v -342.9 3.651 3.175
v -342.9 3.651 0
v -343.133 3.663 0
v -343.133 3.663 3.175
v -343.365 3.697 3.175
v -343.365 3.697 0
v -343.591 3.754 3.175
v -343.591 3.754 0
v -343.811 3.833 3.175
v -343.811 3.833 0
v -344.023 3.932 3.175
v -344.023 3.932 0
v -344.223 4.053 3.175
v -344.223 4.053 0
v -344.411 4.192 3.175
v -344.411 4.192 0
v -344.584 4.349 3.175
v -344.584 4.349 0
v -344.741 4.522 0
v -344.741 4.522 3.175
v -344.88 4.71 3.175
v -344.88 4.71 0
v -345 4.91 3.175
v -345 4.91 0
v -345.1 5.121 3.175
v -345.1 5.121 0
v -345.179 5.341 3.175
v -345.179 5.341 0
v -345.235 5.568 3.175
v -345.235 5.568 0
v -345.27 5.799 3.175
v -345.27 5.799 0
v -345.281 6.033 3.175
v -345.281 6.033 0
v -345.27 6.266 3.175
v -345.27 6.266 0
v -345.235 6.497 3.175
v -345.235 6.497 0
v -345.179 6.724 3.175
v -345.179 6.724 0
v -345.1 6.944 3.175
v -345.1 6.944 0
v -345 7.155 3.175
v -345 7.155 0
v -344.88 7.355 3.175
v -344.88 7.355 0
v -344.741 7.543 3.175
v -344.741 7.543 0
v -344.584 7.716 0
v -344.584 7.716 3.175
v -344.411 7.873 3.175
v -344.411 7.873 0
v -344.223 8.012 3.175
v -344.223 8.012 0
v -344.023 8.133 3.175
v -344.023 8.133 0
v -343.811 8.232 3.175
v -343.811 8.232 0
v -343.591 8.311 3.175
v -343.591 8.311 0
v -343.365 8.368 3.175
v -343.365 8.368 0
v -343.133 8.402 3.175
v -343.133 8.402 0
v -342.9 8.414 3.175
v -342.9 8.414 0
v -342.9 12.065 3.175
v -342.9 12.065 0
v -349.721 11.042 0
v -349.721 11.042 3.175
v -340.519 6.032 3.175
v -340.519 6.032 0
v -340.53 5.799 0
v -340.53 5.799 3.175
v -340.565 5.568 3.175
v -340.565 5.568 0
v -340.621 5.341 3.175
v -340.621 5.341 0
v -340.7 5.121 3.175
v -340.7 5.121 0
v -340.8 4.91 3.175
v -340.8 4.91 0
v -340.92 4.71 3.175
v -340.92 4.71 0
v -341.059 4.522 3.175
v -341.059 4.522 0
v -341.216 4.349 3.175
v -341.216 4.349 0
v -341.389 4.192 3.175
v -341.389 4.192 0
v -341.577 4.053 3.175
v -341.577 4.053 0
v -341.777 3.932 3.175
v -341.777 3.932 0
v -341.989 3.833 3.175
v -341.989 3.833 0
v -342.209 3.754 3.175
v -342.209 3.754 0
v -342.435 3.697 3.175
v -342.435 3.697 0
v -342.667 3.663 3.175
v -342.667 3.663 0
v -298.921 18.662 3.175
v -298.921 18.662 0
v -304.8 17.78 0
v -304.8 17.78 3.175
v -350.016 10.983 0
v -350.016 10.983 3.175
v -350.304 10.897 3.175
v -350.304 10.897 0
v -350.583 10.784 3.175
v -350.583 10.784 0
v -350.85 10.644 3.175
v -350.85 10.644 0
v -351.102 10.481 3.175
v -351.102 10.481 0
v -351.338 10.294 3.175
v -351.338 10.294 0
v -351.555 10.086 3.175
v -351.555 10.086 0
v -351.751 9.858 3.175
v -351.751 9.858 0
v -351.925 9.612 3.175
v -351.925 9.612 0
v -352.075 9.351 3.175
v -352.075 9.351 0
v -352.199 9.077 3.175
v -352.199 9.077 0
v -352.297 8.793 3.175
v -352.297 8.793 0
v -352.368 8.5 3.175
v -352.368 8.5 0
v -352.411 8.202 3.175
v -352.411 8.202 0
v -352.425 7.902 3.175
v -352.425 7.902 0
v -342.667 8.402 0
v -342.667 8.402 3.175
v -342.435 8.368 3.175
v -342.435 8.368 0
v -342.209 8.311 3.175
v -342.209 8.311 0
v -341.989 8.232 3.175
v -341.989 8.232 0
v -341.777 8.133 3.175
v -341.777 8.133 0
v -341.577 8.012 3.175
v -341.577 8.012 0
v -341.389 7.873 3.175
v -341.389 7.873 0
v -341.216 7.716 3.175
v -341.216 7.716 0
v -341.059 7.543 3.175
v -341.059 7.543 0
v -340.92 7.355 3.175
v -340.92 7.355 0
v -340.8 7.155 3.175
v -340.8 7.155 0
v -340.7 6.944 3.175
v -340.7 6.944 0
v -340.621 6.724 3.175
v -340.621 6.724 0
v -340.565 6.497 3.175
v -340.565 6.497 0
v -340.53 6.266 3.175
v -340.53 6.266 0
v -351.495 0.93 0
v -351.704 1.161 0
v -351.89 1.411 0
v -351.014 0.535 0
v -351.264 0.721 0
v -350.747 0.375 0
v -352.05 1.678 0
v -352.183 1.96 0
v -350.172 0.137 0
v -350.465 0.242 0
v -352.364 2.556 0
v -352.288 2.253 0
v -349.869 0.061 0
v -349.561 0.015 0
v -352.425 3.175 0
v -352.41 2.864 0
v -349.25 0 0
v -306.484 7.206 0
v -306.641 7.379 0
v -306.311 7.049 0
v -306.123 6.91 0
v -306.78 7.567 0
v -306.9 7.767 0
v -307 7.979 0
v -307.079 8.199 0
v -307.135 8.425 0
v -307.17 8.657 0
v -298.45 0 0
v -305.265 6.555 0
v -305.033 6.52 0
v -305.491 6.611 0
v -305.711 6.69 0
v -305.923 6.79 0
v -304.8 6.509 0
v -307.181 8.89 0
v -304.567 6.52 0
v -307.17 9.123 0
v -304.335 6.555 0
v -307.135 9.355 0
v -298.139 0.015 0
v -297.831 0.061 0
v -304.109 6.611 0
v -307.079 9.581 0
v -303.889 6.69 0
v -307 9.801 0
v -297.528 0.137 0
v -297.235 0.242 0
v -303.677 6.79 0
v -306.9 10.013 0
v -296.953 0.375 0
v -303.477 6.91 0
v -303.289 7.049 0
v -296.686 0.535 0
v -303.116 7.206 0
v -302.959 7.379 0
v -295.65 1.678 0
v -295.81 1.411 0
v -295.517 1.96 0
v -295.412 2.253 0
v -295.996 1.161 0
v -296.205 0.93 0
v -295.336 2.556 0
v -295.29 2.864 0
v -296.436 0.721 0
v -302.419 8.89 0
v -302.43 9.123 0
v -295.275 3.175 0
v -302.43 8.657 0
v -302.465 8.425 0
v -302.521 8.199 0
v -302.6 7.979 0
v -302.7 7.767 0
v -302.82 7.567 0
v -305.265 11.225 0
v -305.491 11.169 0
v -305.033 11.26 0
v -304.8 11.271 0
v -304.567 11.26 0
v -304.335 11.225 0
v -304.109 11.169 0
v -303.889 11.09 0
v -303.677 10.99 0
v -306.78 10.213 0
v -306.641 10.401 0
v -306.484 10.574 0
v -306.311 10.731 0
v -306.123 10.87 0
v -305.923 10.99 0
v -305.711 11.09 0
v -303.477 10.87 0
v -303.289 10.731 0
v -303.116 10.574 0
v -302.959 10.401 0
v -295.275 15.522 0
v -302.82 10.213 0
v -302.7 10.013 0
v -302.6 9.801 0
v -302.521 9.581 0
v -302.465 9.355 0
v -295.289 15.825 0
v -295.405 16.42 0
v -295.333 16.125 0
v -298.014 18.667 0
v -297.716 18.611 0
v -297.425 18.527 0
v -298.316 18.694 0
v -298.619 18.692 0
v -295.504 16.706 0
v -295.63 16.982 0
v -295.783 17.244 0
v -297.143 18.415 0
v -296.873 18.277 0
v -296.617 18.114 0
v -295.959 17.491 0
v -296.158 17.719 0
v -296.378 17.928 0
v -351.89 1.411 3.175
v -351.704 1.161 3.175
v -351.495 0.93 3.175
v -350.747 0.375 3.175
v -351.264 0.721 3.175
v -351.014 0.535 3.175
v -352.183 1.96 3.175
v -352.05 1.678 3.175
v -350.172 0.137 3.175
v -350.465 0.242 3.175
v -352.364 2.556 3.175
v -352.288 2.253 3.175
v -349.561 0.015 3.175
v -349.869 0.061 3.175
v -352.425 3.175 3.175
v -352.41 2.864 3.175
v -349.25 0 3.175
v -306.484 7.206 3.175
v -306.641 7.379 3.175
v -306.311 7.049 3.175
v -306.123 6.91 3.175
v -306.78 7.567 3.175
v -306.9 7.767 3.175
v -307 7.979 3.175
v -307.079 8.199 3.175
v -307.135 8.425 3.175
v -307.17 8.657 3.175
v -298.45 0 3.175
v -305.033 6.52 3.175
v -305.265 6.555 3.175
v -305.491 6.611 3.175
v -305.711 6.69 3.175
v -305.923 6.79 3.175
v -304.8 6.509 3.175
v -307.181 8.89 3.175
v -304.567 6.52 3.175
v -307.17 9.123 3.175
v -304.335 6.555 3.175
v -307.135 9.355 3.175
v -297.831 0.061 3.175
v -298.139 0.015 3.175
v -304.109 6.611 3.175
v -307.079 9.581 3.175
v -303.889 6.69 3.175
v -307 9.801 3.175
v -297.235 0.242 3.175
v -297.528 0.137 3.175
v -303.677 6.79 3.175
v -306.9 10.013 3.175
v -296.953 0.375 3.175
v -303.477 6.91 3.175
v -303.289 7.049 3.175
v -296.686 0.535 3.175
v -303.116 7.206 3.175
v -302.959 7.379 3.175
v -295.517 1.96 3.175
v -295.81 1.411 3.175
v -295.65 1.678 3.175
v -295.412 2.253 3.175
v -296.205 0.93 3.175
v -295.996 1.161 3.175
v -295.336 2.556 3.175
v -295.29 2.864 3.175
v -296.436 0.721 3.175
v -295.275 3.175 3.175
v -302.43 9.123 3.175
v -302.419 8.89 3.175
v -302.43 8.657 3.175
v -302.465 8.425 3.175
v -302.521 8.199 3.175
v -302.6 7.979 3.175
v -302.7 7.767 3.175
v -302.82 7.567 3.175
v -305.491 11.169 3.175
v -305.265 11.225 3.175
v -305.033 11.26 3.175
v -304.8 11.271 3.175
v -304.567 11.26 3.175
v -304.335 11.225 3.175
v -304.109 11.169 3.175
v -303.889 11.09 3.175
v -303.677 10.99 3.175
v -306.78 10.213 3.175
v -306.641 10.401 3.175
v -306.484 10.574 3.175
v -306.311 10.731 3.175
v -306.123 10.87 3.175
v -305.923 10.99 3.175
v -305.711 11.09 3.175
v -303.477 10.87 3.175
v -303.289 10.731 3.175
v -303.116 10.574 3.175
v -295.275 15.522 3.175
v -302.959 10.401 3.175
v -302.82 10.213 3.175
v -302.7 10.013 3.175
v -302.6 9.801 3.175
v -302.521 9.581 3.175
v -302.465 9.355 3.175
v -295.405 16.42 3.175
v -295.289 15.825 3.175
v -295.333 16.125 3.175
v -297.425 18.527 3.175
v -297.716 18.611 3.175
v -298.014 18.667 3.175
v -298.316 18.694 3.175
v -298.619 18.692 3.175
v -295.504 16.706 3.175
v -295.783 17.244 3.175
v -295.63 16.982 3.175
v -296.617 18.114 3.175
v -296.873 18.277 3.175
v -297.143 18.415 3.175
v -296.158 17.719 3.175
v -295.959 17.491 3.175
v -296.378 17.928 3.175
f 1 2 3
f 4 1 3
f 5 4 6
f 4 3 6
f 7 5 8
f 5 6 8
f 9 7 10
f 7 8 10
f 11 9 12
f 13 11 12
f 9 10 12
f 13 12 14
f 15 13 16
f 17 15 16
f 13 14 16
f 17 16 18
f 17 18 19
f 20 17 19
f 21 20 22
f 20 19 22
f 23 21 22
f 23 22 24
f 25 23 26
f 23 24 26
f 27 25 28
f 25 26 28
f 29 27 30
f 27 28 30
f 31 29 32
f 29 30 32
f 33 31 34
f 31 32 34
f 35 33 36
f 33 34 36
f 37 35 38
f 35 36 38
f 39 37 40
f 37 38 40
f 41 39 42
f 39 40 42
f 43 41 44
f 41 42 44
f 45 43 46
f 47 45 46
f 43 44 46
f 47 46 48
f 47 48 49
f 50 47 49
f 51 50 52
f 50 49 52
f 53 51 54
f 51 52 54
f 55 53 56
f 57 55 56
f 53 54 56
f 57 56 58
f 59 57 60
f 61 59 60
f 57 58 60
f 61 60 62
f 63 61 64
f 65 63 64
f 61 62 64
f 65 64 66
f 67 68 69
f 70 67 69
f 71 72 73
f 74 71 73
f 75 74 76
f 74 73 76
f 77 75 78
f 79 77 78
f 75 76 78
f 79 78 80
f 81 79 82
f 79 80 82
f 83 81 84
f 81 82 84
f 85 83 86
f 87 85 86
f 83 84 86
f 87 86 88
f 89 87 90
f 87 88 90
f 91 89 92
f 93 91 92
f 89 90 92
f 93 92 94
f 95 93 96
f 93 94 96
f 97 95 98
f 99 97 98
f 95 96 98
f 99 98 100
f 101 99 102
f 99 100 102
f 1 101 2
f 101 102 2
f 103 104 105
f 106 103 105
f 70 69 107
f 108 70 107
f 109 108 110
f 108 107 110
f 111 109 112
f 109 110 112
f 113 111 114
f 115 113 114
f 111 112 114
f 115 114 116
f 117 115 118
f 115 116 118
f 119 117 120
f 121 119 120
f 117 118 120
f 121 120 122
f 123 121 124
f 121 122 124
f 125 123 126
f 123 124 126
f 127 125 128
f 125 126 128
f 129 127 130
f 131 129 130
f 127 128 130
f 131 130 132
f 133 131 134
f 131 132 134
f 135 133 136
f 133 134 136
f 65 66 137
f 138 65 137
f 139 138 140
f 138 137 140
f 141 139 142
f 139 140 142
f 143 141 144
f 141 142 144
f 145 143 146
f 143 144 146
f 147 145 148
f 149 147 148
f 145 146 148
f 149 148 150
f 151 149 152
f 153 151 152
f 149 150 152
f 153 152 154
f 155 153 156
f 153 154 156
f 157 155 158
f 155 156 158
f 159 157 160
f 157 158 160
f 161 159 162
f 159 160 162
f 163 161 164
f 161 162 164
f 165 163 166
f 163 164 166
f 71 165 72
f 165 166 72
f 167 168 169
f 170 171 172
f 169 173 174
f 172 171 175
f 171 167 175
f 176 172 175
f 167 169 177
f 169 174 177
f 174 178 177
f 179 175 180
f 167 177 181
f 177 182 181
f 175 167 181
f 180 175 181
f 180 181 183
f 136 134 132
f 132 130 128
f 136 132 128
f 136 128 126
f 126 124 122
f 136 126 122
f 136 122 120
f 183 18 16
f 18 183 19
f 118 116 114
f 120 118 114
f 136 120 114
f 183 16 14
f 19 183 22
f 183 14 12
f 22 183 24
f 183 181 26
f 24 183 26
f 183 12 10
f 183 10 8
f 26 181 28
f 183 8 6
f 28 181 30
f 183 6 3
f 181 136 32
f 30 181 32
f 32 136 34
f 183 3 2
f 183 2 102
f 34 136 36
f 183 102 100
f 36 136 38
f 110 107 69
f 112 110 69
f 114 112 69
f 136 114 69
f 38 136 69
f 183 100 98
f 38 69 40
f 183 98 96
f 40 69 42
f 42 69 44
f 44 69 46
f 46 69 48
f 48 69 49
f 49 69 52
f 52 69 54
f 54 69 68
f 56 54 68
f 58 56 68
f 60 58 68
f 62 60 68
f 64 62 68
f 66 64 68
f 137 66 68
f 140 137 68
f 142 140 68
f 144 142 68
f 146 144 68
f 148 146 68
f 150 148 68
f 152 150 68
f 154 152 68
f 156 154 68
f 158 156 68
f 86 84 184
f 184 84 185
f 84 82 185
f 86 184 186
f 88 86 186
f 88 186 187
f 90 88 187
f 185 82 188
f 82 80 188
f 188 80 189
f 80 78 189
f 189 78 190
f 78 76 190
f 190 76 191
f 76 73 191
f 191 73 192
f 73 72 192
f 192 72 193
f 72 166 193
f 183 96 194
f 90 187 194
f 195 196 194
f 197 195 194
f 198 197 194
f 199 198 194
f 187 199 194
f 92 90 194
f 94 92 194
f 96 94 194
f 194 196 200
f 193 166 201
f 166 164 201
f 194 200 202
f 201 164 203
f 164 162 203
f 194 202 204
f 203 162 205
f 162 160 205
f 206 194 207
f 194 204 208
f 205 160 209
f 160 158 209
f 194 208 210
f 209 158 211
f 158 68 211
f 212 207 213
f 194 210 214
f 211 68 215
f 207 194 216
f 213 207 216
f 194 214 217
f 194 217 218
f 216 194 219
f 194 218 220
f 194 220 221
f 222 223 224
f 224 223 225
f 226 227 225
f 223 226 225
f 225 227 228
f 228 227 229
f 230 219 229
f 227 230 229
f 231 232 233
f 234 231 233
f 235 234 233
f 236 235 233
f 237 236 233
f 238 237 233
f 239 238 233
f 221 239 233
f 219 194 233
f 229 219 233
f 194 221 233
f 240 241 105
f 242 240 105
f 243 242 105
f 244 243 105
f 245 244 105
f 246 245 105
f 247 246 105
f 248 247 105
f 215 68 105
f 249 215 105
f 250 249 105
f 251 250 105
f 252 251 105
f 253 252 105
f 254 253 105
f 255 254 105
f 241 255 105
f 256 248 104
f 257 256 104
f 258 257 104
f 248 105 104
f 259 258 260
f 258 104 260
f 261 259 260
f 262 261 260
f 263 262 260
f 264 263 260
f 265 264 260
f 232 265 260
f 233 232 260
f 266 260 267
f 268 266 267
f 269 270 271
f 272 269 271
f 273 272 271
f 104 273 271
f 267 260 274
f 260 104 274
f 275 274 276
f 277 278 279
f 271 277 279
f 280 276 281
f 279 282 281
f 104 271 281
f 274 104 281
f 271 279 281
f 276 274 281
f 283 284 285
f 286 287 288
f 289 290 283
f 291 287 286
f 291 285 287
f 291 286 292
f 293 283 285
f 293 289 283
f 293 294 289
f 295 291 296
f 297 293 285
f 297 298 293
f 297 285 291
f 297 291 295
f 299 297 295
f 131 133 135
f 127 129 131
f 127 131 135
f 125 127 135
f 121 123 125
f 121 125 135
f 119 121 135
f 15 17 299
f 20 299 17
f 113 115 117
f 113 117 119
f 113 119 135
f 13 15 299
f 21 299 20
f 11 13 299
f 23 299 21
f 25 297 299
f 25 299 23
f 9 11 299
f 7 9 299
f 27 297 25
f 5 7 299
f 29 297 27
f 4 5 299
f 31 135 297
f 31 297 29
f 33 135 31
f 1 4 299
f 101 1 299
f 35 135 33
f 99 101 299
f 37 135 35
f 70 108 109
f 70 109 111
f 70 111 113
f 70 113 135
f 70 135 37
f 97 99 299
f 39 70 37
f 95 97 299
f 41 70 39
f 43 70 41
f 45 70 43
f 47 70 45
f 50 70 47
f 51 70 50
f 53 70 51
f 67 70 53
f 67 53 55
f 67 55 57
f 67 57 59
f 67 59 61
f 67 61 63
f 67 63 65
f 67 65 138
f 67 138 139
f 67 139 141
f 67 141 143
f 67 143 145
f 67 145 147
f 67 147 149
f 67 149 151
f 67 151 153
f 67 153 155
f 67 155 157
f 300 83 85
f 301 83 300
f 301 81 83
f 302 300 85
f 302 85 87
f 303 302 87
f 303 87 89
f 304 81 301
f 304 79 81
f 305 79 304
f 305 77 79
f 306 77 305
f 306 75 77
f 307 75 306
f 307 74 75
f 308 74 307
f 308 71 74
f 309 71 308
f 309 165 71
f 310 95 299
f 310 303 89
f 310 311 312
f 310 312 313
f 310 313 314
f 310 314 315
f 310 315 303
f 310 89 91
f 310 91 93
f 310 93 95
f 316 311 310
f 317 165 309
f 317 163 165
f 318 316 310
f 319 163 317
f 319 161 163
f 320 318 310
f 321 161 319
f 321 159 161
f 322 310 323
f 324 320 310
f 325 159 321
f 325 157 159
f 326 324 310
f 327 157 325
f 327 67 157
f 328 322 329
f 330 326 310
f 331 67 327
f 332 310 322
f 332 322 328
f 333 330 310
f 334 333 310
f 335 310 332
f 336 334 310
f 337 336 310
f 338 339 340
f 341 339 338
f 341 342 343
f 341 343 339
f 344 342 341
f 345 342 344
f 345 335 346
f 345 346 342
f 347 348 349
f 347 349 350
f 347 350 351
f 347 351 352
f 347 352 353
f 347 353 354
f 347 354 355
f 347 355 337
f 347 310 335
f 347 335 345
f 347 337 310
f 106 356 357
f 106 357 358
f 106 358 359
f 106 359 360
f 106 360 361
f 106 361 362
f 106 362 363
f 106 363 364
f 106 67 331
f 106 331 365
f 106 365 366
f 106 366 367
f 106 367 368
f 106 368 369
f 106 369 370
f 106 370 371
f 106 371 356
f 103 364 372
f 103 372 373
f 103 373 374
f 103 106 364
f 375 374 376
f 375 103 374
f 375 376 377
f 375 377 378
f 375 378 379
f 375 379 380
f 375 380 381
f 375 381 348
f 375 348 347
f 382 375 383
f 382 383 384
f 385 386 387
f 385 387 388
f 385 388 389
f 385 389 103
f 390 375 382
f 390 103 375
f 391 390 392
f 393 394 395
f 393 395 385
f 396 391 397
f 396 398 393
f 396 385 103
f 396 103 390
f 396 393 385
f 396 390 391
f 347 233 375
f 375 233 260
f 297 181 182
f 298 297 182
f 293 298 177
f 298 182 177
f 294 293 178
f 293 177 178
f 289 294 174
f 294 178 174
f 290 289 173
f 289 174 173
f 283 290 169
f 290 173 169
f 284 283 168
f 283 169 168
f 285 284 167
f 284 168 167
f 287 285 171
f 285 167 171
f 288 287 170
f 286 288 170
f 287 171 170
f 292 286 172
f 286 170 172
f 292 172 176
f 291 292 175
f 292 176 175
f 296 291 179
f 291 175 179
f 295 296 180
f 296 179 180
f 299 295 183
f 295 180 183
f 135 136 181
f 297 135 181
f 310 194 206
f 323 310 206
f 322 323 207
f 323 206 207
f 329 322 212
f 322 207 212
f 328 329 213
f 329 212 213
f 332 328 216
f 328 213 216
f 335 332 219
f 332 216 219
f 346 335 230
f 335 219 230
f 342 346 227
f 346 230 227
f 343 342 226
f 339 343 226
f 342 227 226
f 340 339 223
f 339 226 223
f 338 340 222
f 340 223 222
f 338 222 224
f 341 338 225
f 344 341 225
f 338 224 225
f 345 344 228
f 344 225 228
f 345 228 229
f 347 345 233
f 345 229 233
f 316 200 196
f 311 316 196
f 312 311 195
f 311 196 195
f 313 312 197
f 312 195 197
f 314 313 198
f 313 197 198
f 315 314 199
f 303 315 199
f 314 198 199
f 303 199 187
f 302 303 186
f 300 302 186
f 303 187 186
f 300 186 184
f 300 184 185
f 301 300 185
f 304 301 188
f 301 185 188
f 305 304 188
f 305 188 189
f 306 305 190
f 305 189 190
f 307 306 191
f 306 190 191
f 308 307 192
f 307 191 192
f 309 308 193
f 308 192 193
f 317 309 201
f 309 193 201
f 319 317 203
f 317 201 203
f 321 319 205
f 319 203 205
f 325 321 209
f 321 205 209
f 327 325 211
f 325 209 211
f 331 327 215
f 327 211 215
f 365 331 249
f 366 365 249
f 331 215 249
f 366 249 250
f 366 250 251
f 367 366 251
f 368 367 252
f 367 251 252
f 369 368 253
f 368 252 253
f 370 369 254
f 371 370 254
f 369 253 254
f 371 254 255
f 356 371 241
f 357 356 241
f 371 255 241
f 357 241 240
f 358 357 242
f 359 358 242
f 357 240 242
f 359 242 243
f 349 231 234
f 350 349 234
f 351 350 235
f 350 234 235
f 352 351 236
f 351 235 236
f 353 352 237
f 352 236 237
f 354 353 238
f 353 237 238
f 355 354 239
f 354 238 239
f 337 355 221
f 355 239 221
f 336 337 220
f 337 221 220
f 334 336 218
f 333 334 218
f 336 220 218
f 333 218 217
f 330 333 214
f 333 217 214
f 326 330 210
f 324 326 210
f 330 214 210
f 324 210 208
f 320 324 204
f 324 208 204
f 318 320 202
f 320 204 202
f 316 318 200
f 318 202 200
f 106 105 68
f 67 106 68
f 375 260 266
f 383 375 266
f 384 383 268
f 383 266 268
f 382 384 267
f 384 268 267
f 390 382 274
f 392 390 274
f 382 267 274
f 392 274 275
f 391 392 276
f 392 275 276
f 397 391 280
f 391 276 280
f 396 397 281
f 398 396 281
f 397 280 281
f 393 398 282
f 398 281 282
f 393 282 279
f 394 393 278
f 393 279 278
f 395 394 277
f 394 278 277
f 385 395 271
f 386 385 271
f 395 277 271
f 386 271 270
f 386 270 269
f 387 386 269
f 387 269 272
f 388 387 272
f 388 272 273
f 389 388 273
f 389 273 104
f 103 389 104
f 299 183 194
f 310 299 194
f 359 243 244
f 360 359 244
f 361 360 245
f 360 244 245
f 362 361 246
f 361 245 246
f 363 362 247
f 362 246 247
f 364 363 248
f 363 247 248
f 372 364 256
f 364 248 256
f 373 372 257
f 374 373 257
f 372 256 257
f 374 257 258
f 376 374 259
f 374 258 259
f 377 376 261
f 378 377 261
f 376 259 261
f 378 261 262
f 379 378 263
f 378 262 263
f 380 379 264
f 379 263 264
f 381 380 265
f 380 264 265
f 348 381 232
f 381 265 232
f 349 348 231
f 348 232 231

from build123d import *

# Parameters (mm, degrees)
BOSS_EXTRUDE1_DEPTH = 3.175


with BuildPart() as part:
    # Sketch1 → Boss-Extrude1 (new body)
    with BuildSketch(Plane.XY):
        with BuildLine():
            Line((-342.9, 12.065), (-349.720980938, 11.041852859))
            ThreePointArc((-349.720980938, 11.041852859), (-351.655825168, 9.97384631), (-352.425, 7.901979939))
            Line((-352.425, 7.901979939), (-352.425, 3.175))
            ThreePointArc((-352.425, 3.175), (-351.49506403, 0.92993597), (-349.25, 0))
            Line((-349.25, 0), (-342.9, 0))
            Line((-342.9, 0), (-342.9, 3.65125))
            ThreePointArc((-342.9, 3.65125), (-345.28125, 6.0325), (-342.9, 8.41375))
            Line((-342.9, 8.41375), (-342.9, 12.065))
        make_face()
        with BuildLine():
            Line((-304.8, 17.78), (-342.9, 12.065))
            Line((-342.9, 12.065), (-342.9, 8.41375))
            ThreePointArc((-342.9, 8.41375), (-341.216201977, 7.716298023), (-340.51875, 6.0325))
            ThreePointArc((-340.51875, 6.0325), (-341.216201977, 4.348701977), (-342.9, 3.65125))
            Line((-342.9, 3.65125), (-342.9, 0))
            Line((-342.9, 0), (-304.8, 0))
            Line((-304.8, 0), (-304.8, 6.50875))
            ThreePointArc((-304.8, 6.50875), (-307.18125, 8.89), (-304.8, 11.27125))
            Line((-304.8, 11.27125), (-304.8, 17.78))
        make_face()
        with BuildLine():
            Line((-298.920980938, 18.661852859), (-304.8, 17.78))
            Line((-304.8, 17.78), (-304.8, 11.27125))
            ThreePointArc((-304.8, 11.27125), (-303.116201977, 10.573798023), (-302.41875, 8.89))
            ThreePointArc((-302.41875, 8.89), (-303.116201977, 7.206201977), (-304.8, 6.50875))
            Line((-304.8, 6.50875), (-304.8, 0))
            Line((-304.8, 0), (-298.45, 0))
            ThreePointArc((-298.45, 0), (-296.20493597, 0.92993597), (-295.275, 3.175))
            Line((-295.275, 3.175), (-295.275, 15.521979939))
            ThreePointArc((-295.275, 15.521979939), (-296.378133629, 17.927805107), (-298.920980938, 18.661852859))
        make_face()
    extrude(amount=BOSS_EXTRUDE1_DEPTH)


solid = part.part
